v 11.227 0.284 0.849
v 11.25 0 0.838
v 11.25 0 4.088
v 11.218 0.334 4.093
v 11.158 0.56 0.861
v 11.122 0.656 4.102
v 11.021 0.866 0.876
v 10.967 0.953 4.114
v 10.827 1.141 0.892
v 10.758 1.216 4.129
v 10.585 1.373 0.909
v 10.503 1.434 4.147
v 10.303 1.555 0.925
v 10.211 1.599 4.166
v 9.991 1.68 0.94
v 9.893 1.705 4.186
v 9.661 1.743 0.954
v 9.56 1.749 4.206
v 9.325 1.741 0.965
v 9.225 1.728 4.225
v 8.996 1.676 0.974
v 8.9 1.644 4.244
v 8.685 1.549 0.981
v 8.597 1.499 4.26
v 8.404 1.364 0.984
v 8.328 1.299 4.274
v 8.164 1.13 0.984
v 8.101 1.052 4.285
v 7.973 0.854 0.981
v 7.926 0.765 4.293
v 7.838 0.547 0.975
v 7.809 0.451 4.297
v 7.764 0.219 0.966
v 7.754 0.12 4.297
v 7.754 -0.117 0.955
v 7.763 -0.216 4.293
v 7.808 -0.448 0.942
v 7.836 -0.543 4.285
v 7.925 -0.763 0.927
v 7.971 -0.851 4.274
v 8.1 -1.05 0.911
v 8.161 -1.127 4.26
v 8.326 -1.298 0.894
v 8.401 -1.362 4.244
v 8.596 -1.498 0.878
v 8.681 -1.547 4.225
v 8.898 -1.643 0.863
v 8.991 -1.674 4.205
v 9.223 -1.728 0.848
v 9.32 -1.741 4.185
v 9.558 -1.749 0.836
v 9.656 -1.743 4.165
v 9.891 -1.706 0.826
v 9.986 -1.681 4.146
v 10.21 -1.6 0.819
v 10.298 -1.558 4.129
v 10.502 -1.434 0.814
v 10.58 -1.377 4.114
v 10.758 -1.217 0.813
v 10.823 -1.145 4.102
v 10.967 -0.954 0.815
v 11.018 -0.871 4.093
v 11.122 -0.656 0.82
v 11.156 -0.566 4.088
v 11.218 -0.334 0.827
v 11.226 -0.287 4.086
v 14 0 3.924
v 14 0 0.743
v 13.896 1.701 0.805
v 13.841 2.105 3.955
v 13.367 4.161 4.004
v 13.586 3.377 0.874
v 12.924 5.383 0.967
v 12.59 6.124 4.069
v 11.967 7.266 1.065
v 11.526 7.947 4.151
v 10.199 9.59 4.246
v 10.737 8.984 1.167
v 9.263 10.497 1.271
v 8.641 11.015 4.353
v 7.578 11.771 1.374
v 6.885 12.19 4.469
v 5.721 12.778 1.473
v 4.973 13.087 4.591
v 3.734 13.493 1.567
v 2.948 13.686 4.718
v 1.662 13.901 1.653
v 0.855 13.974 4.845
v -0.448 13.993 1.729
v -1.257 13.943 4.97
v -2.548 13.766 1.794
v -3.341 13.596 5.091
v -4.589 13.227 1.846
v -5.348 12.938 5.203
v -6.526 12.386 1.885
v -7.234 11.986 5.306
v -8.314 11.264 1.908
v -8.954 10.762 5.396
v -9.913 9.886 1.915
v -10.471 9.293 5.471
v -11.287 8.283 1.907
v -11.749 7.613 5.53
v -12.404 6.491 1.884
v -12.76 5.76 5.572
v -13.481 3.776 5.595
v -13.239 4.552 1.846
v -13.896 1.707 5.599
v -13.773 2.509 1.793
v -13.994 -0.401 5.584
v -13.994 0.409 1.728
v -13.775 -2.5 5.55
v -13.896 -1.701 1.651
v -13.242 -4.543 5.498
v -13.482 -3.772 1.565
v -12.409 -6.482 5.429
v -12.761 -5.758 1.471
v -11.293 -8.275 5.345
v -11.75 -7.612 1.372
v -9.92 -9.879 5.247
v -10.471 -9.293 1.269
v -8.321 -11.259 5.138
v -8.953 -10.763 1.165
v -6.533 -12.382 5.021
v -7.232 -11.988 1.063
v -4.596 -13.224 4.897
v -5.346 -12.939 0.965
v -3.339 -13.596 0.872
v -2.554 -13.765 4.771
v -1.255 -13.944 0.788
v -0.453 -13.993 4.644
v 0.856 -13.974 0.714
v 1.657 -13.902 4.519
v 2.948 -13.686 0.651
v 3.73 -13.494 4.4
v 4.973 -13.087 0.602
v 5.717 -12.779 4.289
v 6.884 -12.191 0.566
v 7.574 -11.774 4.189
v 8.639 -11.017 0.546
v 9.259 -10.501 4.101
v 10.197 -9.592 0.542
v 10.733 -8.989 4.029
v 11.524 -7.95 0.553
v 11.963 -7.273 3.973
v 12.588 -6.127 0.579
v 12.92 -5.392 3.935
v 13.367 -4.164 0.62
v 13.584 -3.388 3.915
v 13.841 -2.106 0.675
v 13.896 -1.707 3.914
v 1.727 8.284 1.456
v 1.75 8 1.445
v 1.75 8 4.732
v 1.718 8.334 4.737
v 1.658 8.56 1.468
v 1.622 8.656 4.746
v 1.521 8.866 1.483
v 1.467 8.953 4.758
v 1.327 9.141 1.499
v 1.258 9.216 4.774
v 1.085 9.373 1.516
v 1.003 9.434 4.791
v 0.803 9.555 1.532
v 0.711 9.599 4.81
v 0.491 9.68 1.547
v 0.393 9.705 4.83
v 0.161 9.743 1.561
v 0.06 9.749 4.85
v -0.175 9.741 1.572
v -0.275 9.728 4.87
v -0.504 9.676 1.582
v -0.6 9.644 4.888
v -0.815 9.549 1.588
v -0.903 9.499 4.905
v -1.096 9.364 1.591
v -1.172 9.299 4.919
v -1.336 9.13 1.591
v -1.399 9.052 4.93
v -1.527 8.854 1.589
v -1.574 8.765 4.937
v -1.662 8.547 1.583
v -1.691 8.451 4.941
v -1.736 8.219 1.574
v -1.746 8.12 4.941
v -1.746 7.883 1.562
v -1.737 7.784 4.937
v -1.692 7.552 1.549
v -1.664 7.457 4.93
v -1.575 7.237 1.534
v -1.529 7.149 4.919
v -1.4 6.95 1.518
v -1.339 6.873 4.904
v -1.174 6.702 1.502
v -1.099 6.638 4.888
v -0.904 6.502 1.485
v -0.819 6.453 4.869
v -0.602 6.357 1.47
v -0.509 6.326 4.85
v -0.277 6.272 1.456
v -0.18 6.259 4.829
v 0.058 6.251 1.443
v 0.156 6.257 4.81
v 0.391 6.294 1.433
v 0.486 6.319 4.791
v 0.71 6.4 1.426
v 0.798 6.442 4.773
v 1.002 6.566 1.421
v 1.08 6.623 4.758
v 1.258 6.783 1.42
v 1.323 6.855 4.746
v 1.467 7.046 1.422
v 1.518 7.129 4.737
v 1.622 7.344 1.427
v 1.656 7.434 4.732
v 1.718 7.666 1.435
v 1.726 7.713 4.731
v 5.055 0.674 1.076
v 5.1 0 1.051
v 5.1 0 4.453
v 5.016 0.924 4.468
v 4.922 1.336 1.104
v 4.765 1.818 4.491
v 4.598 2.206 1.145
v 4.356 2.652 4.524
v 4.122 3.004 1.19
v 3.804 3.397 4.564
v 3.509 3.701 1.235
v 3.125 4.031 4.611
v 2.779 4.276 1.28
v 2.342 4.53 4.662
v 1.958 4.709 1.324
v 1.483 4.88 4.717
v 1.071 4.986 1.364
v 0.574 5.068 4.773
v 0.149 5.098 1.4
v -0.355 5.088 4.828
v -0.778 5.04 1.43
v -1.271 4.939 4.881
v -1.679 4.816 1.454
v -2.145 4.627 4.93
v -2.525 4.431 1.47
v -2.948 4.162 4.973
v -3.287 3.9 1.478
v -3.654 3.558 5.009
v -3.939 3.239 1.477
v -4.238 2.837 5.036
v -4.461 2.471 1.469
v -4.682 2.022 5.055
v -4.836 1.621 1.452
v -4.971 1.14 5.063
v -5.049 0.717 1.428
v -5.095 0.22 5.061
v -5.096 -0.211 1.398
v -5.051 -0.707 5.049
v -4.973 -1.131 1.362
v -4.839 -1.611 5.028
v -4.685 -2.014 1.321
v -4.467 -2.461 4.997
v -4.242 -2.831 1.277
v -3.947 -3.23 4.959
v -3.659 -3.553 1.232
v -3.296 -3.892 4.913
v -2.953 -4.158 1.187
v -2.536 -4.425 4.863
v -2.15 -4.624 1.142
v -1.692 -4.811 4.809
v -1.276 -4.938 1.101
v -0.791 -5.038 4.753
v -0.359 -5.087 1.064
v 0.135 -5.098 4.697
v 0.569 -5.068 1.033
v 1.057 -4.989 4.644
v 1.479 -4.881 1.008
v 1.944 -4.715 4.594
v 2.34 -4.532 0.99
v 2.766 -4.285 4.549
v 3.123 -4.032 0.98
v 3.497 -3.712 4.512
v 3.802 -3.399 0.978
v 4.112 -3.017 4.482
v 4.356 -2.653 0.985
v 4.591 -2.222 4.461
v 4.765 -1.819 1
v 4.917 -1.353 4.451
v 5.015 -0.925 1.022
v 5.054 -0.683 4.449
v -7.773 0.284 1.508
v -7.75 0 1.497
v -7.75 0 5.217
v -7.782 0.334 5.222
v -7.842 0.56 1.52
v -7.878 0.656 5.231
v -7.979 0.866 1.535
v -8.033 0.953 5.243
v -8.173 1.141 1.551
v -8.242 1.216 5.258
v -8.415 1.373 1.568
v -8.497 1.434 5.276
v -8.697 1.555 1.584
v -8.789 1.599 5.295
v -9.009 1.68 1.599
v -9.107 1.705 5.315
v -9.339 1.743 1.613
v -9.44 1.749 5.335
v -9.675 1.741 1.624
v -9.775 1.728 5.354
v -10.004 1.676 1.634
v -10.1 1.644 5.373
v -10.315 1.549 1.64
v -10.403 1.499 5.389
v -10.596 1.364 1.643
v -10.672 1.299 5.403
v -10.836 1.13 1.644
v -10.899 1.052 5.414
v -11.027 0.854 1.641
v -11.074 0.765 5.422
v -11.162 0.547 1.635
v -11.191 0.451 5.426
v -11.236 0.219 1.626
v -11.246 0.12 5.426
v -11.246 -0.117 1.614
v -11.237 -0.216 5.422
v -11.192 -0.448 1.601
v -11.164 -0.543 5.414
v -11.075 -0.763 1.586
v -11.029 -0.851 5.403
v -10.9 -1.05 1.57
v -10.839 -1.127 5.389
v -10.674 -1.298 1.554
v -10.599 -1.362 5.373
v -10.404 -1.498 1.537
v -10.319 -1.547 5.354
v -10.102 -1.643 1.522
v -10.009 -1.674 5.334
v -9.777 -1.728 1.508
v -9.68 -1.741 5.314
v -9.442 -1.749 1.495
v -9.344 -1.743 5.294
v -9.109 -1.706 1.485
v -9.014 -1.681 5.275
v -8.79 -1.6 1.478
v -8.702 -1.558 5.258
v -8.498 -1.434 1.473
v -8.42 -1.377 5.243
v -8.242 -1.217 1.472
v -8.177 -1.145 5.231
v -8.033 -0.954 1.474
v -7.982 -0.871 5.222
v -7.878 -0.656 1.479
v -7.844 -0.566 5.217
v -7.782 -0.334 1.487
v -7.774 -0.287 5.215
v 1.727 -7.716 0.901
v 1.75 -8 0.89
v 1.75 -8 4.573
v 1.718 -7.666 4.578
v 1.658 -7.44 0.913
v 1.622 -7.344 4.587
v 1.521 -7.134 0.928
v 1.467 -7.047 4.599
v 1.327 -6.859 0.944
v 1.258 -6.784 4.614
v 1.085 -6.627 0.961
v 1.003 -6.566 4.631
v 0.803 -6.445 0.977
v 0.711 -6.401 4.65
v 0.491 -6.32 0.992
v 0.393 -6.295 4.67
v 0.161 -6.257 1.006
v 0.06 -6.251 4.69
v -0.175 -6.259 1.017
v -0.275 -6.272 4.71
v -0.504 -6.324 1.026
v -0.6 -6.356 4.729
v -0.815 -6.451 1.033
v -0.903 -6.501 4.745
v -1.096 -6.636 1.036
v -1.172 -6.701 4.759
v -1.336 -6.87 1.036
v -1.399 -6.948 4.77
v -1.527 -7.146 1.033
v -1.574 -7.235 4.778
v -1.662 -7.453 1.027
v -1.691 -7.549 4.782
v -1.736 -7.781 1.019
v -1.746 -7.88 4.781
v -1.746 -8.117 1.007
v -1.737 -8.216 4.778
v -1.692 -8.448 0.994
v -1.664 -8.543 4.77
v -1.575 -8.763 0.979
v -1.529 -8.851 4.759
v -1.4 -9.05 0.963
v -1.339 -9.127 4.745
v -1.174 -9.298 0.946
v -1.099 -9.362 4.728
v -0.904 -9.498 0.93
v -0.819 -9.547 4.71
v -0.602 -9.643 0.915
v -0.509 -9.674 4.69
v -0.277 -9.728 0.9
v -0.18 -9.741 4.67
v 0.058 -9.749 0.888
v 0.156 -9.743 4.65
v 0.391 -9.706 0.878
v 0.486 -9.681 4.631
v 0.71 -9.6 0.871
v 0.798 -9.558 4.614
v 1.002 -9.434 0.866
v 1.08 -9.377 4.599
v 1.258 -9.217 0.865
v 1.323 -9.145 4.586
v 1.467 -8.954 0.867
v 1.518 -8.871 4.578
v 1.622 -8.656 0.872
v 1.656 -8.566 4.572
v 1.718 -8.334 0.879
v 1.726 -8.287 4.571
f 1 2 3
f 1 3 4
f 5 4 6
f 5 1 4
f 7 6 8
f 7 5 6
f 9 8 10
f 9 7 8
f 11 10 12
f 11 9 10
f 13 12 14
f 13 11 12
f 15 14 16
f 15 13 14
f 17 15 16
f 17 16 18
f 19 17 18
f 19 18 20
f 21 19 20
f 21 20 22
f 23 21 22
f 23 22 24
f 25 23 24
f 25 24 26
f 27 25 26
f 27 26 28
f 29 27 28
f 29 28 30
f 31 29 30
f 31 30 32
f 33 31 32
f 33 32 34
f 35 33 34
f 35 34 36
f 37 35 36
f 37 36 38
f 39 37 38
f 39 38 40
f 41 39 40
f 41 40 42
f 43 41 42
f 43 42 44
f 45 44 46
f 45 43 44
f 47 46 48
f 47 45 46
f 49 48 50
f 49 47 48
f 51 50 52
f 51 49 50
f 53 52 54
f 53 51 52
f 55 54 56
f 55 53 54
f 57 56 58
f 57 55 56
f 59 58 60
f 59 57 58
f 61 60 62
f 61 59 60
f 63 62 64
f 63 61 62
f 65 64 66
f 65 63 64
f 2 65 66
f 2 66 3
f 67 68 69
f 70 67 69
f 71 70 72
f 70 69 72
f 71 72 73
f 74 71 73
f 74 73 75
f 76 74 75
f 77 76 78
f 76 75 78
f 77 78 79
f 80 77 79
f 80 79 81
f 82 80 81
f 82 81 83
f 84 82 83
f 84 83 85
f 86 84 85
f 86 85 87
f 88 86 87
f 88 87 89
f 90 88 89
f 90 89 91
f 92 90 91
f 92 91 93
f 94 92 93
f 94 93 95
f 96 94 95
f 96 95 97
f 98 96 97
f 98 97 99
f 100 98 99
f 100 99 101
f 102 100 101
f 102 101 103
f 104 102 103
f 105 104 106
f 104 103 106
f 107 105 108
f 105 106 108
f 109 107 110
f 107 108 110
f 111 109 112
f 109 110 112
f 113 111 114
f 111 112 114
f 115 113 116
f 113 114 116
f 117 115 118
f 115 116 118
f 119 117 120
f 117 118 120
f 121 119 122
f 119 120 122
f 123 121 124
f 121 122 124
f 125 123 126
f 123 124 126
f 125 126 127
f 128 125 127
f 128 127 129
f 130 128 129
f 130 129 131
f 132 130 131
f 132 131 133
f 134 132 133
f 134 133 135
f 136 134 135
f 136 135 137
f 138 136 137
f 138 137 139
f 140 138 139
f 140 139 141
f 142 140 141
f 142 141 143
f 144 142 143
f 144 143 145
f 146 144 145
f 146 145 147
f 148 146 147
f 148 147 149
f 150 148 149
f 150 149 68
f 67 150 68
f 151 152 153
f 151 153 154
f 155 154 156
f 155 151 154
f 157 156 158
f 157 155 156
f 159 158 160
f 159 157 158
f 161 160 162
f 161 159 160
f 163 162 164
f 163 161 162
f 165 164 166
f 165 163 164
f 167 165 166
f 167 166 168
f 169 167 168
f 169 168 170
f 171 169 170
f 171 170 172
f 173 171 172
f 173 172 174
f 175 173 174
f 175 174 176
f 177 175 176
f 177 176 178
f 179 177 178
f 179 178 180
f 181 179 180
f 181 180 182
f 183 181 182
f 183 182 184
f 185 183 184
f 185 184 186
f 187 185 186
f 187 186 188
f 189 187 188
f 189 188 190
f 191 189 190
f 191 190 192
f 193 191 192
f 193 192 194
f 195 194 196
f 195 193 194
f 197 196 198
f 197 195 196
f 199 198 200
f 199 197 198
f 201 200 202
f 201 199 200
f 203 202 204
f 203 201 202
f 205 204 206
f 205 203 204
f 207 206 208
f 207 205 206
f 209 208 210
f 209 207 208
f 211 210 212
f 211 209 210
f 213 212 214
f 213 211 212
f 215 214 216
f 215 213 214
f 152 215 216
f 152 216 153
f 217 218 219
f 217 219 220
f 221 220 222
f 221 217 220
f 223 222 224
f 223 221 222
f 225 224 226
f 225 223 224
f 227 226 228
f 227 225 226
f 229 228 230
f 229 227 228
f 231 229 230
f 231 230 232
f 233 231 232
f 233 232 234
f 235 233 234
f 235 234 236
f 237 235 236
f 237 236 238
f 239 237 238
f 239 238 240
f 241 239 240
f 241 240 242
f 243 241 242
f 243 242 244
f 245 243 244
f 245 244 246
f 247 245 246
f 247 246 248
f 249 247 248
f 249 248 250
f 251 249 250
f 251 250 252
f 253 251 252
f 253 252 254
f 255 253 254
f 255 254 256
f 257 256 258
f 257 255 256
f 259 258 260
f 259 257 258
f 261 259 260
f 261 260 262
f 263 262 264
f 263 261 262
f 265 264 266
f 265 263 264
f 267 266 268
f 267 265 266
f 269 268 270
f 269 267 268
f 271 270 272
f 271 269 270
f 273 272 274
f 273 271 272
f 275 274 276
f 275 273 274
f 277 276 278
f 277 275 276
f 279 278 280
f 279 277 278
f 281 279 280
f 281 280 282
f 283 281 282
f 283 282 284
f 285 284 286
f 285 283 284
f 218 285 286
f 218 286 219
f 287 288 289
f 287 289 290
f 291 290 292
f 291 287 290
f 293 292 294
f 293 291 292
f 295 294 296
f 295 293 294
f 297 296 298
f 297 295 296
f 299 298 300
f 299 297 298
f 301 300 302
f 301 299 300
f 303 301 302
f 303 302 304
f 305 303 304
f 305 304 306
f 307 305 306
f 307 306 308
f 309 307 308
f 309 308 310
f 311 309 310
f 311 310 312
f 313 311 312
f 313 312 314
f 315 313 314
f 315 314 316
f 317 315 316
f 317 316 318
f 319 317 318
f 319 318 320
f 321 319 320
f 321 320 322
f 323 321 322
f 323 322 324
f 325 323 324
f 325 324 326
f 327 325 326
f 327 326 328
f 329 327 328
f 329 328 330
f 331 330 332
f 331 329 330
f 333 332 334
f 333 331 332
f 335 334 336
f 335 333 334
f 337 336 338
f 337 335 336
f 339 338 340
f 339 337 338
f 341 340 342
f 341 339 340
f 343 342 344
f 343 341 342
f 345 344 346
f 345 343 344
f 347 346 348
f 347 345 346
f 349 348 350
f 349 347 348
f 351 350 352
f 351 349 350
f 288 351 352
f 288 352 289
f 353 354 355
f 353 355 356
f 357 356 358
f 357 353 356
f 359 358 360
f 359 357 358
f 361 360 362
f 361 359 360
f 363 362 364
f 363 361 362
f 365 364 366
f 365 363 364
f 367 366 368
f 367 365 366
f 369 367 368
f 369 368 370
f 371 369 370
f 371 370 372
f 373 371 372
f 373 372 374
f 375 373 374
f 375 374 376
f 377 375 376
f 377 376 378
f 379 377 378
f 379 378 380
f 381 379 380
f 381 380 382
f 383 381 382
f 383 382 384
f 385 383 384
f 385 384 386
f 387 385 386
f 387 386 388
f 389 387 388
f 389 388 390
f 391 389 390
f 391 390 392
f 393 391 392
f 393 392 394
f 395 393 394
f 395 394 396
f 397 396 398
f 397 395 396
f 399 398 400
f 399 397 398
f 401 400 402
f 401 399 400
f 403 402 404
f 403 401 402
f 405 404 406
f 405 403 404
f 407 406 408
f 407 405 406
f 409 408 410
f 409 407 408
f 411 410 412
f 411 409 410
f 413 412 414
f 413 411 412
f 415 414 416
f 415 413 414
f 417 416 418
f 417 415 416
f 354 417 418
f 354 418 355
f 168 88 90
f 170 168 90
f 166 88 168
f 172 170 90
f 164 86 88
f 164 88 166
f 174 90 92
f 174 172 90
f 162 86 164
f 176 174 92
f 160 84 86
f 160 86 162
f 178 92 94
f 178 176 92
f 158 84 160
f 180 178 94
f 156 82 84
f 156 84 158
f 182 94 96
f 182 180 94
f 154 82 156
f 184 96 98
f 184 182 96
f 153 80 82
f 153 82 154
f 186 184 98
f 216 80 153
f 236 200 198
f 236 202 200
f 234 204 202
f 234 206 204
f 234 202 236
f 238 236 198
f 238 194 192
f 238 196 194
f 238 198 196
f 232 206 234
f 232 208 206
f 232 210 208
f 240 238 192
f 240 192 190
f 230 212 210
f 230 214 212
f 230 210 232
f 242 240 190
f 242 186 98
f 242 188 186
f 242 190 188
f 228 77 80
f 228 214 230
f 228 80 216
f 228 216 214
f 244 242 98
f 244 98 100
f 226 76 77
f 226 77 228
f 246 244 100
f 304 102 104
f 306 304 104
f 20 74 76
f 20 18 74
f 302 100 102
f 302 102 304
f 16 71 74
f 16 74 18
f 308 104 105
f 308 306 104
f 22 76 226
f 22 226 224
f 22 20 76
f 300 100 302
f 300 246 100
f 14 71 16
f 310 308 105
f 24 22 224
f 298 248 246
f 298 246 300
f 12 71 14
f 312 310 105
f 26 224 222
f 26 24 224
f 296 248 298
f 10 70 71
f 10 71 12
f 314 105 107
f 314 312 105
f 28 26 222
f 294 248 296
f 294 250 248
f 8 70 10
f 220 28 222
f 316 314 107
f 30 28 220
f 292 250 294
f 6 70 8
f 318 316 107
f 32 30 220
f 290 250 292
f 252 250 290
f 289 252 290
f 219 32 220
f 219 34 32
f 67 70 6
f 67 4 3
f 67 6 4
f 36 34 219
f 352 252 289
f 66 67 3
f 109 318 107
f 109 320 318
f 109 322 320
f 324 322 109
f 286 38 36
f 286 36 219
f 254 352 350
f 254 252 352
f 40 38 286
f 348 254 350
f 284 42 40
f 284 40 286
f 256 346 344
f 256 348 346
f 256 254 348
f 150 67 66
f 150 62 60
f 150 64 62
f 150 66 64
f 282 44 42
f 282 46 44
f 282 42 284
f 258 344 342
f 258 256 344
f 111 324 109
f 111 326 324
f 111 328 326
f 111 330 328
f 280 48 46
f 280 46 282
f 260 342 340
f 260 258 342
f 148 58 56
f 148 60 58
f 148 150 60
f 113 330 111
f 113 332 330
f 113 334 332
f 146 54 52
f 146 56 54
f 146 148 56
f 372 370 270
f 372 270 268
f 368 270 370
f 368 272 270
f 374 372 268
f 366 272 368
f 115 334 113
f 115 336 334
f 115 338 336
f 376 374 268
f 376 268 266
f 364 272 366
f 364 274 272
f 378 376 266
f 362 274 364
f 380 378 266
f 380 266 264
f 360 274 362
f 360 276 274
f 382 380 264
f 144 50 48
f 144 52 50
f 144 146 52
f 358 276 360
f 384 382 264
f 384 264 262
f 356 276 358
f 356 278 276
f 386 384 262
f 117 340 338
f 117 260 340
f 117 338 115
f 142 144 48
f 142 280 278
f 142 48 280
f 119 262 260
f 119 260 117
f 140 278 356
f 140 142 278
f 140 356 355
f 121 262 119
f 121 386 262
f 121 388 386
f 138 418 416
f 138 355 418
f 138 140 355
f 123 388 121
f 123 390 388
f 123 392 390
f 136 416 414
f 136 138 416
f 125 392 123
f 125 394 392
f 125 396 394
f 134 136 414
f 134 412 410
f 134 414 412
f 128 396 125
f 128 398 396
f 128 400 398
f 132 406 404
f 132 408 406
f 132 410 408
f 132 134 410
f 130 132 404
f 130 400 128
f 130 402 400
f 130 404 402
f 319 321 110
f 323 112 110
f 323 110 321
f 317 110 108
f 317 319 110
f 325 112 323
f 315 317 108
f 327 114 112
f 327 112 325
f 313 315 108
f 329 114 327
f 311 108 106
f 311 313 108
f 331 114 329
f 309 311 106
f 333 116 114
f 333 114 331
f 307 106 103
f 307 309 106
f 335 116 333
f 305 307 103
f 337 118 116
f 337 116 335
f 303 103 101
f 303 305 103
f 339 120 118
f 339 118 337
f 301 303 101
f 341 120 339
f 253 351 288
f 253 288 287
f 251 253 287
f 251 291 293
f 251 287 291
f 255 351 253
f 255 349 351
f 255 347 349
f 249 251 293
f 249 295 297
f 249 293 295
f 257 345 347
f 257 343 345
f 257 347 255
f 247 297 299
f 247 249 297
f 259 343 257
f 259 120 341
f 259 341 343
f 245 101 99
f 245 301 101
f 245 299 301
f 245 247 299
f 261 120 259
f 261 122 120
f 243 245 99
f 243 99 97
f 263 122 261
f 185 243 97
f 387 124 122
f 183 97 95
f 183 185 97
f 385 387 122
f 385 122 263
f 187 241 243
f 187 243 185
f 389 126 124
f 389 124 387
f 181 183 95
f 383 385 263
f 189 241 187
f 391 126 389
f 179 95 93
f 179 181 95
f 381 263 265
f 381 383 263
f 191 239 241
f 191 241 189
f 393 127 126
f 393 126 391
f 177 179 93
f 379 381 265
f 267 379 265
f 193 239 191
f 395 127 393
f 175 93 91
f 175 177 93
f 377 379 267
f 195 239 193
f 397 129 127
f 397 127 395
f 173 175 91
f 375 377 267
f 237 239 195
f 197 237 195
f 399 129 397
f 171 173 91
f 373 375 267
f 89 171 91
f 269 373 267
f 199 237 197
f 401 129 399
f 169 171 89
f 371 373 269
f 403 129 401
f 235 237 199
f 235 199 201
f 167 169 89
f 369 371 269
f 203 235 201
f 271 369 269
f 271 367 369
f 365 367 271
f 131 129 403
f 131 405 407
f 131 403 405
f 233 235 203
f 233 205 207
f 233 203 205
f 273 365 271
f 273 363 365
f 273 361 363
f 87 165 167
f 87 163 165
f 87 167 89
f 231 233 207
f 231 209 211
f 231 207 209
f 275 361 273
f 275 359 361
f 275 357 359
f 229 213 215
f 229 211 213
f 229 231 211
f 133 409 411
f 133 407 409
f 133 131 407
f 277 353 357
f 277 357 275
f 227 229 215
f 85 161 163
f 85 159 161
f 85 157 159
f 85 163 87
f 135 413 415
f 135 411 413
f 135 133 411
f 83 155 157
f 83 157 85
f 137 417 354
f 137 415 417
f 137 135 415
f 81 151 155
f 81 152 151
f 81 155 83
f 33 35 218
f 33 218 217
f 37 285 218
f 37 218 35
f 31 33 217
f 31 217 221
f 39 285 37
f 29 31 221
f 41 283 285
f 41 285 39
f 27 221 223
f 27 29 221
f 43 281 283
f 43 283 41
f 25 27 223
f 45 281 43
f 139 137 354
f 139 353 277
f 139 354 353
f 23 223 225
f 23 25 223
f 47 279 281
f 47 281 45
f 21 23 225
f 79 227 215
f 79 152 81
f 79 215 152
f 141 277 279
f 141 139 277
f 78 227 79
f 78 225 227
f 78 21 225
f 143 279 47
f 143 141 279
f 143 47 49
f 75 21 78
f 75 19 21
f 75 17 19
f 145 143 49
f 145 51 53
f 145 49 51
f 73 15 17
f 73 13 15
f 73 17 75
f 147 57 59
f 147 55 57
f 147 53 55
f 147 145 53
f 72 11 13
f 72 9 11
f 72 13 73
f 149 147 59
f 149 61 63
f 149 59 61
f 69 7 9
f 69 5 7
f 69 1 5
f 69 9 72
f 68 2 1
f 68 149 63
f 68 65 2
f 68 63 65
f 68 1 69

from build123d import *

# Parameters (mm, degrees)
F0_R     = 14
F0_R_2   = 1.75
F0_R_3   = 5.1
F1_DEPTH = 10
F6_DEPTH = 40


with BuildPart() as f1:
    # F0 (on Top) → F1 (new body)
    with BuildSketch(Plane.XY):
        Circle(F0_R)
        with Locations((0, -8)):
            Circle(F0_R_2, mode=Mode.SUBTRACT)
        with Locations((-9.5, 0)):
            Circle(F0_R_2, mode=Mode.SUBTRACT)
        Circle(F0_R_3, mode=Mode.SUBTRACT)
        with Locations((9.5, 0)):
            Circle(F0_R_2, mode=Mode.SUBTRACT)
        with Locations((0, 8)):
            Circle(F0_R_2, mode=Mode.SUBTRACT)
    extrude(amount=F1_DEPTH)

    # F5 (on face) → F6 (intersect)
    with BuildSketch(Plane(origin=(17.6564226245, -17.6564226245, -1.2253490154), x_dir=(0.7045622489, 0.7079556371, -0.0488963521), z_dir=(0.706256905, -0.706256905, -0.0490139606))):
        Polygon((-42.6054166353, 4.1487906781), (-42.3605061004, -0.8479598781), (14.9219552549, 1.9596804268), (14.7750896798, 4.9560833541), align=None)
        Polygon((14.7750896798, 4.9560833541), (14.9219552549, 1.9596804268), (100.7277084193, 6.1653602332), align=None)
    extrude(amount=-F6_DEPTH, mode=Mode.INTERSECT)


solid = f1.part
